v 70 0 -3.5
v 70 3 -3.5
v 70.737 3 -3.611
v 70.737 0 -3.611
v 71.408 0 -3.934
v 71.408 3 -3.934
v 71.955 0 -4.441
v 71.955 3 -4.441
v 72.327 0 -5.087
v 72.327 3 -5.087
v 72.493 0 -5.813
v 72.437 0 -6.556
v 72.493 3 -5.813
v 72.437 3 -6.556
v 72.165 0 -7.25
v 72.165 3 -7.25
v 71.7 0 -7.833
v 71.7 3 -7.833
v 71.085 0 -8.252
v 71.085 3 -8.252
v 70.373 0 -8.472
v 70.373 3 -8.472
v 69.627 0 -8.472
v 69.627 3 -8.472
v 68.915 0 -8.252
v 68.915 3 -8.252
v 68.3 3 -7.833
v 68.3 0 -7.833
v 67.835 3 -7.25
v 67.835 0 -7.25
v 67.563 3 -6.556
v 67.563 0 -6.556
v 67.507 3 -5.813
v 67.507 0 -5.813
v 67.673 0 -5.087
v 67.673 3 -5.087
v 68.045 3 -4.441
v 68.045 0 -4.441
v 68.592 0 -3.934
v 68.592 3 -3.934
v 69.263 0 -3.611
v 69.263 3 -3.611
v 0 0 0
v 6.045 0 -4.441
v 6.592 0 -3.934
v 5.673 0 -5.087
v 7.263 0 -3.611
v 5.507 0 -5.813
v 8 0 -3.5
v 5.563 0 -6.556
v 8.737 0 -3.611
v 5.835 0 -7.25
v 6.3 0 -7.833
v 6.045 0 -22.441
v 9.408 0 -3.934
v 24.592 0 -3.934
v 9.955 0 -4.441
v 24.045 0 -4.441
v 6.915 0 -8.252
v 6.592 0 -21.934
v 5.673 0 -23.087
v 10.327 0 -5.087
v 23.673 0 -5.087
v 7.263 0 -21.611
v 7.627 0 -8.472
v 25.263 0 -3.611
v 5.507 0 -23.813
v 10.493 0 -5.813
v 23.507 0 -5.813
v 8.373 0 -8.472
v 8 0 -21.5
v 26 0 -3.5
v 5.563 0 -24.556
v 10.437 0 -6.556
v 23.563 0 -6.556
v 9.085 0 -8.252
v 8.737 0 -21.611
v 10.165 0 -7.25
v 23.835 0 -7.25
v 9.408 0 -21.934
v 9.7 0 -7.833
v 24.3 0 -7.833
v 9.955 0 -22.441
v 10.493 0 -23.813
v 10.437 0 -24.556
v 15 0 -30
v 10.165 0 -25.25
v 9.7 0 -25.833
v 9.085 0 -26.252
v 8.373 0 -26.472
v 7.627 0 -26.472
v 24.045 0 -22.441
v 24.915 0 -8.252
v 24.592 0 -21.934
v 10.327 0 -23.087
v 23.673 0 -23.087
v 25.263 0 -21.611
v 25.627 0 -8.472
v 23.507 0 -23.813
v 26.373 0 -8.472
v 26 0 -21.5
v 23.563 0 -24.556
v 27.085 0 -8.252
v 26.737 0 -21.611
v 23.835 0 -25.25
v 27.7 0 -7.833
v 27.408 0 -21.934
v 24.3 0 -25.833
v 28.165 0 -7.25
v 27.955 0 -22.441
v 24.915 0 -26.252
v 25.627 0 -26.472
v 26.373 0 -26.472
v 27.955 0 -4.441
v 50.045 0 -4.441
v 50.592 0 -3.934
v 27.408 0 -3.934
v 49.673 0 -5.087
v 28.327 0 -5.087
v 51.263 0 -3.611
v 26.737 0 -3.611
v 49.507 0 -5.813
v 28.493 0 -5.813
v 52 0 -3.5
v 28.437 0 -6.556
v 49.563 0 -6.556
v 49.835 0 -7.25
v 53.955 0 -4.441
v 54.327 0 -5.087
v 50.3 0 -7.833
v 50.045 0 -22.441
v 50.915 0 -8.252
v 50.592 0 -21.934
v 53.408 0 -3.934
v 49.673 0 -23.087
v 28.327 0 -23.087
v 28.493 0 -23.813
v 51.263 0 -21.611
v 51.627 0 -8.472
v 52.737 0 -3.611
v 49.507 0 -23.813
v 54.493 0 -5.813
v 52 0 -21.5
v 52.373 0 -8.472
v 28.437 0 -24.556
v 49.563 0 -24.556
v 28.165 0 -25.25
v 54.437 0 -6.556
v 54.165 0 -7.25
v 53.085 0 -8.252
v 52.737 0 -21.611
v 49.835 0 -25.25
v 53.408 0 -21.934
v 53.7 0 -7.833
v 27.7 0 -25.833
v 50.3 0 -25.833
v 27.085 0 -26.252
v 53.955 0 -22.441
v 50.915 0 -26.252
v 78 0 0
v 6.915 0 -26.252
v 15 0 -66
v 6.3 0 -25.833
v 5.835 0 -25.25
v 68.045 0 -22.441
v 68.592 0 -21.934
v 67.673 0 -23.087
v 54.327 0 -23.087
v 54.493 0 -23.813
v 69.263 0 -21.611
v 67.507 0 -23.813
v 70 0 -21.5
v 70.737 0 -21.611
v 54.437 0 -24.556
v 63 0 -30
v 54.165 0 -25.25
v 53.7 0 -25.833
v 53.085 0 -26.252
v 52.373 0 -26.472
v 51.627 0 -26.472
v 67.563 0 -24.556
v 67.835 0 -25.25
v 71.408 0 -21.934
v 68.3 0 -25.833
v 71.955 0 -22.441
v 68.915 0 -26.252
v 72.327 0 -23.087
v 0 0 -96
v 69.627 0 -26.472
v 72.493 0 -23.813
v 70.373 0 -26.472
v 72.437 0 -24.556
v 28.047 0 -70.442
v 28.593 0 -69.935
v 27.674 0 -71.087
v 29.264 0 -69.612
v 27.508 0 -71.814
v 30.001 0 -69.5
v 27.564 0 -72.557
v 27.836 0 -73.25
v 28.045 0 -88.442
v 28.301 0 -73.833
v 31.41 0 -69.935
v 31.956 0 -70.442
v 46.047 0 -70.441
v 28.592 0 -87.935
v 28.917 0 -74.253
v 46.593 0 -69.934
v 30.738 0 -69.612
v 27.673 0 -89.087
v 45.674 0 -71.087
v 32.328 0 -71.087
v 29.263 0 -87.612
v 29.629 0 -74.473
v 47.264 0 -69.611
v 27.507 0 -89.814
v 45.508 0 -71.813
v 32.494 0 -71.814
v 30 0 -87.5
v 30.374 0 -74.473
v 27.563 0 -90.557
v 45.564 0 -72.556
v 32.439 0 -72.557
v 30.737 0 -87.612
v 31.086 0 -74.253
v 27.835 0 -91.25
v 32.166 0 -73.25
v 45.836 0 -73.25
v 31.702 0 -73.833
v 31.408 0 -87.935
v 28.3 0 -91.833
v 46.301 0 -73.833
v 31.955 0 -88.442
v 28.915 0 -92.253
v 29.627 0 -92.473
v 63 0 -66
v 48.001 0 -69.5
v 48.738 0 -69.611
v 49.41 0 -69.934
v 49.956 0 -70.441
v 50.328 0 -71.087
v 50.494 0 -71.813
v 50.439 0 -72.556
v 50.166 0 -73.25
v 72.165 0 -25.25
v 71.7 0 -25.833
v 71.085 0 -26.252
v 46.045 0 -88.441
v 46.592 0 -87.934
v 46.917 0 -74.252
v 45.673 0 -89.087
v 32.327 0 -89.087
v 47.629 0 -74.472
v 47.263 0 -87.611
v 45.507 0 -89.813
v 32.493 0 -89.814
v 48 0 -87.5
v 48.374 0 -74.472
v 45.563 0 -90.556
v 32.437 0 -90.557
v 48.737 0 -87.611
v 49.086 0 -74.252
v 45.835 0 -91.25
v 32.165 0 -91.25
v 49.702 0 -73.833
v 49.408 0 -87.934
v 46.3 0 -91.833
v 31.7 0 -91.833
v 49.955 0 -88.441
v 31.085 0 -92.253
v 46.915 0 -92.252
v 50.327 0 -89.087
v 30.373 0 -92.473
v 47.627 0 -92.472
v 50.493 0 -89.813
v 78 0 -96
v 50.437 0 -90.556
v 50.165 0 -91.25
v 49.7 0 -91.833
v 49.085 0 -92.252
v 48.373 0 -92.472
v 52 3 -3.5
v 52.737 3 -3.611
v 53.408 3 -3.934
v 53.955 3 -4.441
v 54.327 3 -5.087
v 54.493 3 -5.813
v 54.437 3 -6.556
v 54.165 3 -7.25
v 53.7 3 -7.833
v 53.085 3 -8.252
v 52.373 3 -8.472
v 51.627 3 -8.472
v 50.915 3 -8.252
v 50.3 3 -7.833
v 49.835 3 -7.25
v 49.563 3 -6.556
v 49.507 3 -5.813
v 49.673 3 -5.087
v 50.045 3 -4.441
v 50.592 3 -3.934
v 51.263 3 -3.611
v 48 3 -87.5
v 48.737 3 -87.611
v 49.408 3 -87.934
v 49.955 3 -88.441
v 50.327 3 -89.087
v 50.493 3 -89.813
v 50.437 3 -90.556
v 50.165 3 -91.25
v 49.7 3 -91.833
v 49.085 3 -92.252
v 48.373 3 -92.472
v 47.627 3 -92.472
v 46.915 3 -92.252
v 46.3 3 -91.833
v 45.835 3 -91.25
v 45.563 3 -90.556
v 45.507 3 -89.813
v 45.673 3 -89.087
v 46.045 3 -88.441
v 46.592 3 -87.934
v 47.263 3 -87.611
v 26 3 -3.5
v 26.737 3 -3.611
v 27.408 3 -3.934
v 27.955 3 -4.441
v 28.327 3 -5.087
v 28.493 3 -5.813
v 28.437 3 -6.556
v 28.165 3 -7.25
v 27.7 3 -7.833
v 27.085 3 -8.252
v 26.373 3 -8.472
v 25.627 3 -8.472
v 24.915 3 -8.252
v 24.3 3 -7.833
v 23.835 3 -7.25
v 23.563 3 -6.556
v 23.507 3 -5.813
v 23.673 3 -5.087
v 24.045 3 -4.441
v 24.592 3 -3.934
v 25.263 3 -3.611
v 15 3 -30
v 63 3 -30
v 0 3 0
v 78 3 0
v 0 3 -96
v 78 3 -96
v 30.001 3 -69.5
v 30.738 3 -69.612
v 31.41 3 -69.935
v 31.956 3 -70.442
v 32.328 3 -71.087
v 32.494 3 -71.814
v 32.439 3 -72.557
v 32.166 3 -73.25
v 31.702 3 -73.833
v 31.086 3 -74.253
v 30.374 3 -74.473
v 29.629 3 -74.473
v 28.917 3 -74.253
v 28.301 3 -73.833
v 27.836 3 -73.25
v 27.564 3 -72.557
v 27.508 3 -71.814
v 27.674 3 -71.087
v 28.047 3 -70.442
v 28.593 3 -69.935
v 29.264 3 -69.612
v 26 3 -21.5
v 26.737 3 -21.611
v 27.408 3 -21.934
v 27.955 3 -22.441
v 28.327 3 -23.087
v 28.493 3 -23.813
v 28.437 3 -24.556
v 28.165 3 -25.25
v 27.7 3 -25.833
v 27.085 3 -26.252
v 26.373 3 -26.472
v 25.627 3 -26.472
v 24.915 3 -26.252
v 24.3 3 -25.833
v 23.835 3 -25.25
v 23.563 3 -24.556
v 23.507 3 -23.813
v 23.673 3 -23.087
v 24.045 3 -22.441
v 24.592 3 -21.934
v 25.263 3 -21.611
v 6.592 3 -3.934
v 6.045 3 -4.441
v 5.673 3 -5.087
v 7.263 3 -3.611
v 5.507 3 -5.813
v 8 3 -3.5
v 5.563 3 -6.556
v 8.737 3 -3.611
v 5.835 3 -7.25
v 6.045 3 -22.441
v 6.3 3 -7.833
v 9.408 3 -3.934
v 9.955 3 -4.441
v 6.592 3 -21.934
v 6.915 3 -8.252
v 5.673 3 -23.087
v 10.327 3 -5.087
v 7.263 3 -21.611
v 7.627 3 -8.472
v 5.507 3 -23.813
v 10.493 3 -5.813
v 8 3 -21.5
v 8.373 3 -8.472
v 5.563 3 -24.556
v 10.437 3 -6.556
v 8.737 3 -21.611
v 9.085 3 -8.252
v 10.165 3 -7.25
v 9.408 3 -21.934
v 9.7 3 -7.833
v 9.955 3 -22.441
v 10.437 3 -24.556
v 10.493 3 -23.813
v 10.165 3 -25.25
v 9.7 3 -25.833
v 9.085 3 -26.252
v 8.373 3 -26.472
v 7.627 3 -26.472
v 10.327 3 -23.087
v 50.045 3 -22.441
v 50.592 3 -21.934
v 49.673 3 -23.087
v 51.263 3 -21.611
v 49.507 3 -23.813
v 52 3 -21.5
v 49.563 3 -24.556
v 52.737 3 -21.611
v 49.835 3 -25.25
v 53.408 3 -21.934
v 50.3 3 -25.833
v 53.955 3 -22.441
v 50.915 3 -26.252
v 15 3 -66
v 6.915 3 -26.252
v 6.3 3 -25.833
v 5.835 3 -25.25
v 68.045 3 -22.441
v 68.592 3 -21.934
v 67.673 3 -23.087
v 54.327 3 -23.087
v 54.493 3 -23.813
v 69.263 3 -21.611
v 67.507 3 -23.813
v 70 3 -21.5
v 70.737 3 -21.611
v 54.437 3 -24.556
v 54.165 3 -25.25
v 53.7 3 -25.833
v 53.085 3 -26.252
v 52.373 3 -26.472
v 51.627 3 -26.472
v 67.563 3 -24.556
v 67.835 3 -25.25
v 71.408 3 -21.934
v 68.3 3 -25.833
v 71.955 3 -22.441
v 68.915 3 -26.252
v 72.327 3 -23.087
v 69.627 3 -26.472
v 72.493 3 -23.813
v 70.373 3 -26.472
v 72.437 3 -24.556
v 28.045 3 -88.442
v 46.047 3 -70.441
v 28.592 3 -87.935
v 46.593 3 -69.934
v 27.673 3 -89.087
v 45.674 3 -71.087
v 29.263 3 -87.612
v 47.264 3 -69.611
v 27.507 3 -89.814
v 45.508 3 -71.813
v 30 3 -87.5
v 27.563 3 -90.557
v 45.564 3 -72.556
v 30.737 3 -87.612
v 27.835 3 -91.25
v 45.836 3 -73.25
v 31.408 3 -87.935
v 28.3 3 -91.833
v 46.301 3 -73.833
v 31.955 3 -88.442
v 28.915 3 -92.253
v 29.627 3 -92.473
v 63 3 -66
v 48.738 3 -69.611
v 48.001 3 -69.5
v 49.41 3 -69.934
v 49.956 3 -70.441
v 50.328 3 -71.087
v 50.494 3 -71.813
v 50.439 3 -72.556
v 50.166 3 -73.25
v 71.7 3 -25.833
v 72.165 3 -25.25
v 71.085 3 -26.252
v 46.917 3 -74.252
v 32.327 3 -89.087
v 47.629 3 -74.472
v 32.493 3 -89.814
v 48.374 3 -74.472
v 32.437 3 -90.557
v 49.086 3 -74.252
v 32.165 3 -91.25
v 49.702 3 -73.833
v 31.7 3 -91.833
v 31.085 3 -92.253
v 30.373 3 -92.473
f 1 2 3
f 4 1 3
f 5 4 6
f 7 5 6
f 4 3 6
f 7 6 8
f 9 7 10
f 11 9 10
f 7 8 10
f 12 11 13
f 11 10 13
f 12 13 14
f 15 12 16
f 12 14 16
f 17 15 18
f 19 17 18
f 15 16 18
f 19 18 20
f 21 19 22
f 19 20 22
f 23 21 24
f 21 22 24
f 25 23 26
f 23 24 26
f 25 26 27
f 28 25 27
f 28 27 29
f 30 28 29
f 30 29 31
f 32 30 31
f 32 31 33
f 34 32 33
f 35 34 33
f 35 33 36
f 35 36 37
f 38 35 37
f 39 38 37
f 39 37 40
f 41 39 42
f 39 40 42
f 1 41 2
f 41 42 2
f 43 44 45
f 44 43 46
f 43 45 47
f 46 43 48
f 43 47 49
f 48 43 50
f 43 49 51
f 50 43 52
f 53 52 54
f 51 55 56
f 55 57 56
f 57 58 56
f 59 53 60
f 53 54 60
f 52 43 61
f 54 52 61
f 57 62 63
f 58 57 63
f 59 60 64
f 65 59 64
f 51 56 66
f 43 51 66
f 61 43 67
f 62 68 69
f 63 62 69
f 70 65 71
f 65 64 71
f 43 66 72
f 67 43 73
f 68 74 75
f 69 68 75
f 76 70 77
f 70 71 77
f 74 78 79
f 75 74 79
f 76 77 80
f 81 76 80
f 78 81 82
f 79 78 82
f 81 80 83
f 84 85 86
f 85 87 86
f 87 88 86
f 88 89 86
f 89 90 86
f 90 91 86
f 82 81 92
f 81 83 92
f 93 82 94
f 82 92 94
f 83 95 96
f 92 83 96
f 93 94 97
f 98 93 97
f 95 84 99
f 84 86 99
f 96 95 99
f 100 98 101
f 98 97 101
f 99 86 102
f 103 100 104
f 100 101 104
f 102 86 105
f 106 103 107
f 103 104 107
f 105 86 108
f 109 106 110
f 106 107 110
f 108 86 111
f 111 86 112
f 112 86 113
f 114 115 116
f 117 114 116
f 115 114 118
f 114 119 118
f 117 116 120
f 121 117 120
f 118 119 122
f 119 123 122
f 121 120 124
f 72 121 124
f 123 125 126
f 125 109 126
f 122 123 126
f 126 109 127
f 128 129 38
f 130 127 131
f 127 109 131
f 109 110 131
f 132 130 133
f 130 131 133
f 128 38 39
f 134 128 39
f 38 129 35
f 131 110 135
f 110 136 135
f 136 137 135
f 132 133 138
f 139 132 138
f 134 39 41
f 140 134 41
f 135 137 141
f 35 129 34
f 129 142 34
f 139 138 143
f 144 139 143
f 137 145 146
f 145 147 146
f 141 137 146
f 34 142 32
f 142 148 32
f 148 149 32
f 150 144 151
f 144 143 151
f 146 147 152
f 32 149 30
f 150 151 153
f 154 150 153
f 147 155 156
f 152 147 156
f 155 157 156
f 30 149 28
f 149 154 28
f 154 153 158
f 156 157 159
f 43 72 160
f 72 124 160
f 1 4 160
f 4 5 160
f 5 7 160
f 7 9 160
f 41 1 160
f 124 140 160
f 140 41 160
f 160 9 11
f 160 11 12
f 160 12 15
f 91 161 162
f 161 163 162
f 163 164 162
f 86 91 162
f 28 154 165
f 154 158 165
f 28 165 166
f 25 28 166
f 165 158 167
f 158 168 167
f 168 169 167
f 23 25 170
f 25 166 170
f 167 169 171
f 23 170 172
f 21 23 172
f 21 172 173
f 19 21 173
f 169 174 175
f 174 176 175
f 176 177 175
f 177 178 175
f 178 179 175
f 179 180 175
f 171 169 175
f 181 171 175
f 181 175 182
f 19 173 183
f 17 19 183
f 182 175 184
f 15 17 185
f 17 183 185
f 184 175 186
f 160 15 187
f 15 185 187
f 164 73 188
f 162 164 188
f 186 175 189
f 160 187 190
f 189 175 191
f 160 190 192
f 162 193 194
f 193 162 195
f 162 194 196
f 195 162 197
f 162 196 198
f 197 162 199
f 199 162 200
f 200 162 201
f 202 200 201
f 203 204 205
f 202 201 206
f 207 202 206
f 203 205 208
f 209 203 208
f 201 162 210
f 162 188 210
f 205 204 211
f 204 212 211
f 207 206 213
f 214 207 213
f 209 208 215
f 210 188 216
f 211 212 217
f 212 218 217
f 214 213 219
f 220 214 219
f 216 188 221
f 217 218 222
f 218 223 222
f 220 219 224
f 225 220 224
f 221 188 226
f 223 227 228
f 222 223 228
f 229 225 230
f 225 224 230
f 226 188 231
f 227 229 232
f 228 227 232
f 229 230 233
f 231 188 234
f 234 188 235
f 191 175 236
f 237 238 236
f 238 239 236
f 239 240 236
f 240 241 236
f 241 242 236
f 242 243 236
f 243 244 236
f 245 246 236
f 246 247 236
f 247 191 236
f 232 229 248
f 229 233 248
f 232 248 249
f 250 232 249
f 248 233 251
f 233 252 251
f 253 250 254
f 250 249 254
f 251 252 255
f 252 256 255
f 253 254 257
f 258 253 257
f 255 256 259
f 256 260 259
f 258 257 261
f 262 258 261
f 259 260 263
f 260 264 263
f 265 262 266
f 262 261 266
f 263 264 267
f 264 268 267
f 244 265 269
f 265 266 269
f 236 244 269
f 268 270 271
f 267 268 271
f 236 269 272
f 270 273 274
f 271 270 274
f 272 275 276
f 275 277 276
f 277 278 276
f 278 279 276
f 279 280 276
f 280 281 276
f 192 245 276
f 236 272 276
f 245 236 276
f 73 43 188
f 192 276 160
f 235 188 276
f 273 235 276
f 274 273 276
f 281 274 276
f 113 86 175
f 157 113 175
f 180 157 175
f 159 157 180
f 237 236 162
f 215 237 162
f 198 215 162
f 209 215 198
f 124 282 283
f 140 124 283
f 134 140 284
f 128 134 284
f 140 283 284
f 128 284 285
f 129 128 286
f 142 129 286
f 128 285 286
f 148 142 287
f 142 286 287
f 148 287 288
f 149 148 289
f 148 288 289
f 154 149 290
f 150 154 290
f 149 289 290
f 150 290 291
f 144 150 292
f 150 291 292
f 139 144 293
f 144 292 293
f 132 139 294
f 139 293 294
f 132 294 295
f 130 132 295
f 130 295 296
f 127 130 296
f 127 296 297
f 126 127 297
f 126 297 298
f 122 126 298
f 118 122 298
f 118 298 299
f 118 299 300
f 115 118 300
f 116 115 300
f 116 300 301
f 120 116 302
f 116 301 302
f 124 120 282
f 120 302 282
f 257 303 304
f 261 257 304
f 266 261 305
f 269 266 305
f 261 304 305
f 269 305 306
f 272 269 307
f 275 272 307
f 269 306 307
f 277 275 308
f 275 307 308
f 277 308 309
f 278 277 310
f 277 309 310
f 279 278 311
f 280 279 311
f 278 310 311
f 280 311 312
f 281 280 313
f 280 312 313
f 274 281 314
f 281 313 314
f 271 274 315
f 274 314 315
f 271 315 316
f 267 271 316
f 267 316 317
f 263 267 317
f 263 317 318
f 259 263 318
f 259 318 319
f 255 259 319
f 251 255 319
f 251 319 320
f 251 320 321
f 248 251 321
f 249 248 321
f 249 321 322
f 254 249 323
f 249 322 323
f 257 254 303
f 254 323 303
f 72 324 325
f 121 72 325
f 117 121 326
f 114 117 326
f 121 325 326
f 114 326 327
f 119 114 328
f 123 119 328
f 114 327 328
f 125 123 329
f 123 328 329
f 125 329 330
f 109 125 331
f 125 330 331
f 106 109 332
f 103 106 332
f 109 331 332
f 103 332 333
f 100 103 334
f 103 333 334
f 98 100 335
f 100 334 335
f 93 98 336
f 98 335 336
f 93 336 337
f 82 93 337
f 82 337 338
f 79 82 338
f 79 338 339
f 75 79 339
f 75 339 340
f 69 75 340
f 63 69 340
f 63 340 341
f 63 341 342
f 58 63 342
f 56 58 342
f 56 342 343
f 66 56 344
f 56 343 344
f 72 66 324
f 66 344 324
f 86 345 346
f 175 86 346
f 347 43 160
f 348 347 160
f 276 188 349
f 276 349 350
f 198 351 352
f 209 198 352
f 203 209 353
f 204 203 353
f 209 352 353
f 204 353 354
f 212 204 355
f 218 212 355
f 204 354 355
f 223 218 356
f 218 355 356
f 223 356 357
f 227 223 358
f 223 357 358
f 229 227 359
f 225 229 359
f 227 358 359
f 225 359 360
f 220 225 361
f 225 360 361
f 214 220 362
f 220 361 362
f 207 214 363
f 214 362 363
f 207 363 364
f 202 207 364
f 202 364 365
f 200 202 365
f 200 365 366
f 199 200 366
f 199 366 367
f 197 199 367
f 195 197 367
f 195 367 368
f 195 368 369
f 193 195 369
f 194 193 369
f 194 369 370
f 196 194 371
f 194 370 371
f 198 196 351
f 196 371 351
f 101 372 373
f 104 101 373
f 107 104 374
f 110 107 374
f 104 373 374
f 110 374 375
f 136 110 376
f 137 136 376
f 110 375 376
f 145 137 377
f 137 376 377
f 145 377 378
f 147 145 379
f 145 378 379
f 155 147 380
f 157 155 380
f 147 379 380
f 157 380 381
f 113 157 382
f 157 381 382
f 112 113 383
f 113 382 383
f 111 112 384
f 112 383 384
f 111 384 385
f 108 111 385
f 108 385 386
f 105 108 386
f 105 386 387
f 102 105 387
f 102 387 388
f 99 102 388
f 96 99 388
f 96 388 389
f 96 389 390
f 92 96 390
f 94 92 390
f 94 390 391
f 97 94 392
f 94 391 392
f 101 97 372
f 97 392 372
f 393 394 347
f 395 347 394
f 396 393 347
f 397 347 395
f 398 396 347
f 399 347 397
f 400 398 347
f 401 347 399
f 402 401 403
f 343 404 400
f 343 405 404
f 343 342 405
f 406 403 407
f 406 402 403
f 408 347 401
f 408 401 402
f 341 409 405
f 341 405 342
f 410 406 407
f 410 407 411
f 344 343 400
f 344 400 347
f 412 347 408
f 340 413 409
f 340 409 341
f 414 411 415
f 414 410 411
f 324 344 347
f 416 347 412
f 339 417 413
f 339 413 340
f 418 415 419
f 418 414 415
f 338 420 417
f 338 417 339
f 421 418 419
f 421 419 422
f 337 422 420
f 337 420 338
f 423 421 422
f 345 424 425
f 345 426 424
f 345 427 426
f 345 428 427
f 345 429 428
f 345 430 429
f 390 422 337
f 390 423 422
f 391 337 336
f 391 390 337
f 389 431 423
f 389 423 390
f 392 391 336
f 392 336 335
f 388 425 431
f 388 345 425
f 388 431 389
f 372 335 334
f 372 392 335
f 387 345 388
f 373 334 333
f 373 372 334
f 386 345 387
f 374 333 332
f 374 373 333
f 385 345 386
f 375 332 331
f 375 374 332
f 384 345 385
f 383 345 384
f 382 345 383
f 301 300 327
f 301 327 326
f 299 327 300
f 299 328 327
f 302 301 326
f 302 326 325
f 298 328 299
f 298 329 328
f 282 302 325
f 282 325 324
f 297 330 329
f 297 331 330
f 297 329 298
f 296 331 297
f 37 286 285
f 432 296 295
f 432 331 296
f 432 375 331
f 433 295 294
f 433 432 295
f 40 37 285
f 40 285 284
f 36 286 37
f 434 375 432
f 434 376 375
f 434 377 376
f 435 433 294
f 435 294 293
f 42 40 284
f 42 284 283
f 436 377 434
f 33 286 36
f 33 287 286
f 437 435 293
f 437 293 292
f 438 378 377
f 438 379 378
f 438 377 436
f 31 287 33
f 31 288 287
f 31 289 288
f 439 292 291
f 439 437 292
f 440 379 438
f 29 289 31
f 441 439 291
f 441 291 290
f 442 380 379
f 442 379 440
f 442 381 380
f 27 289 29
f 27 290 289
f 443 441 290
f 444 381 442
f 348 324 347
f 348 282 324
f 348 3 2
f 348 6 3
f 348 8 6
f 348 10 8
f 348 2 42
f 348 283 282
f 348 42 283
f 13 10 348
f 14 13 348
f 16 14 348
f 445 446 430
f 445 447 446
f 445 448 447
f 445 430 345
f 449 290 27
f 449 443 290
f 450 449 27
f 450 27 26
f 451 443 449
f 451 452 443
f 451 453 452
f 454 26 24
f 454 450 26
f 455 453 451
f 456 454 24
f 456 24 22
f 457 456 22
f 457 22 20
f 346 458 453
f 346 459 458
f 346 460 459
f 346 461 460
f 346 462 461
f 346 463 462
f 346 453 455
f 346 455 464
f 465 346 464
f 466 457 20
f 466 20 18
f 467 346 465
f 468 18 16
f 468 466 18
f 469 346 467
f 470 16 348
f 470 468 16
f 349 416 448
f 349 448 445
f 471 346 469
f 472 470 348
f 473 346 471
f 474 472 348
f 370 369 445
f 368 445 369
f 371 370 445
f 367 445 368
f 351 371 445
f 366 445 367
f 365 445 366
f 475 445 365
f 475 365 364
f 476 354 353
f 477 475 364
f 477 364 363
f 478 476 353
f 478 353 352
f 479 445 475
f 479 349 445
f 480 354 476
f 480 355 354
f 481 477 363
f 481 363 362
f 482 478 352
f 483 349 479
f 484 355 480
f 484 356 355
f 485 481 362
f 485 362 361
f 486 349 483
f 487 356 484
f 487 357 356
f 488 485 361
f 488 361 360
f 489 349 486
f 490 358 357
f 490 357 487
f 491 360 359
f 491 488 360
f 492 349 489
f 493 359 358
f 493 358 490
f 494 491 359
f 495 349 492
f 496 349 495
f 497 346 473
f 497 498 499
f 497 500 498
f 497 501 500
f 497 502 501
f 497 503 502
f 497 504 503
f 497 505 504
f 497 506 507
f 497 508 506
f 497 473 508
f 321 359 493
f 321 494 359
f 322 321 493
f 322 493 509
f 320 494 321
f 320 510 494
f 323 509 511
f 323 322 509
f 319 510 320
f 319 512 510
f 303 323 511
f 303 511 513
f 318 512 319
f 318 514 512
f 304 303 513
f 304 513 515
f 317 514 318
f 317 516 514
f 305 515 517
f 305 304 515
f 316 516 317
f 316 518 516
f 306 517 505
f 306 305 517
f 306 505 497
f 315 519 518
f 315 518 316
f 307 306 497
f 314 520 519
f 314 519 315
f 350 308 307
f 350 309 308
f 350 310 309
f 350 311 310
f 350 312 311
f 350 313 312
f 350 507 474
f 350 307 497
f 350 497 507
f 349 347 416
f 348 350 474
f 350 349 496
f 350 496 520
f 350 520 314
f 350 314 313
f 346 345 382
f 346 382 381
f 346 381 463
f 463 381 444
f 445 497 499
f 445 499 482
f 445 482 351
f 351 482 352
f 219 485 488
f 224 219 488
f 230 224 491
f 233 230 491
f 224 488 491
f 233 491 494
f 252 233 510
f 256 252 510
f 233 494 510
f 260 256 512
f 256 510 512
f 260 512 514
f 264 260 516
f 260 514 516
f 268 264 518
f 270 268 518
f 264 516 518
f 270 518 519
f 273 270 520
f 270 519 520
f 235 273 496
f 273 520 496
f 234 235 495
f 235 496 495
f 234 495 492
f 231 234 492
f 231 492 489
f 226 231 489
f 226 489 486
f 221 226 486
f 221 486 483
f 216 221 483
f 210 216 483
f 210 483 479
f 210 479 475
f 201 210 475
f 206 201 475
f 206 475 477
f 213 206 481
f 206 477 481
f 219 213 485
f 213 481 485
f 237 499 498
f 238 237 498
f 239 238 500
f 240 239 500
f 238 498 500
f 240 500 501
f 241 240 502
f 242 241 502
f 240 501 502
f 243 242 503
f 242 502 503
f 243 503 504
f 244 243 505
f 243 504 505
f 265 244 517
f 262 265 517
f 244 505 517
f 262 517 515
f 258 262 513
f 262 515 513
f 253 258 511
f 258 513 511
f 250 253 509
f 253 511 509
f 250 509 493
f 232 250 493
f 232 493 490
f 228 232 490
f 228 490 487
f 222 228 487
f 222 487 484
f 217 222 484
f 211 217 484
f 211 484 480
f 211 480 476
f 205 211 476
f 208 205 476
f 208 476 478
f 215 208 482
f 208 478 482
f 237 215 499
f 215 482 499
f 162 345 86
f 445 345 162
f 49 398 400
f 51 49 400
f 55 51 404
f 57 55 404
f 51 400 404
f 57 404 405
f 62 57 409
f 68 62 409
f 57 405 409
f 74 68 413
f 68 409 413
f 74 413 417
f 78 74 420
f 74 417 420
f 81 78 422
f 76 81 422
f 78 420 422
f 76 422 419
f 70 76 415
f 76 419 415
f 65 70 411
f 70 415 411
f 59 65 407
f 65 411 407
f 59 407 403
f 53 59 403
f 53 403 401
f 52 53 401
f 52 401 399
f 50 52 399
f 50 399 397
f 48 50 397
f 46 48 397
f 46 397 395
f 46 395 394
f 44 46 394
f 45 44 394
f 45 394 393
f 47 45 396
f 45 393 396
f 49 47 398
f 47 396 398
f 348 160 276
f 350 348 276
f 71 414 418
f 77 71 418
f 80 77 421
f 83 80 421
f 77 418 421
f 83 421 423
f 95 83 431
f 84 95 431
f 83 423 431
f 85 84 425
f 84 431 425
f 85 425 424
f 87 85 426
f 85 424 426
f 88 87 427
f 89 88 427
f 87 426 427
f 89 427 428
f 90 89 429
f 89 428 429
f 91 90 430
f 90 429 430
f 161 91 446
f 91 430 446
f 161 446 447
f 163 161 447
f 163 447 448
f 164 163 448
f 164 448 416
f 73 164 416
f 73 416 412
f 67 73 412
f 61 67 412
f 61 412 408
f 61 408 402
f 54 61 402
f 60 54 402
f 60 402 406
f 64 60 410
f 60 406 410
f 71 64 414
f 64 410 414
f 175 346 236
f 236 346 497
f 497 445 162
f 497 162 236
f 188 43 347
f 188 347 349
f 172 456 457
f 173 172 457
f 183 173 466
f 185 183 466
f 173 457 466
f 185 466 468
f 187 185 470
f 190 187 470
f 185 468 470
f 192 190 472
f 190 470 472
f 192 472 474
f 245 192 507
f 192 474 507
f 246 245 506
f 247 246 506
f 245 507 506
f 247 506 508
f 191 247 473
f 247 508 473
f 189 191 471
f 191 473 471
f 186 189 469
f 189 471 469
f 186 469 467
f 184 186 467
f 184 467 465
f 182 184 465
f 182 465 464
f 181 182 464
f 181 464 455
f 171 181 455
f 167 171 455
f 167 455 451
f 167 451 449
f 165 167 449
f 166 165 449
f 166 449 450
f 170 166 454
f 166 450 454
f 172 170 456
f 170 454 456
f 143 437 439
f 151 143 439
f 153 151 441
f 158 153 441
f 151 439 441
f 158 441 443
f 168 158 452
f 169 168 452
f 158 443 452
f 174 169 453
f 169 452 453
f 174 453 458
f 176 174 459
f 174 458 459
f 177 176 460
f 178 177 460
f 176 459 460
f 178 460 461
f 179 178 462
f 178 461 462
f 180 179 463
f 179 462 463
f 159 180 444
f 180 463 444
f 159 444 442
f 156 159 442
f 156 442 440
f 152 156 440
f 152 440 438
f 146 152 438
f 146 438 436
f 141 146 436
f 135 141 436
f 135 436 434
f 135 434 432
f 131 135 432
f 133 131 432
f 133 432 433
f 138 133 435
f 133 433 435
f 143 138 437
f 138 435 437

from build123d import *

# Parameters (mm, degrees)
SKETCH1_W           = 78
SKETCH1_H           = 96
BOSS_EXTRUDE1_DEPTH = 3
SKETCH2_R           = 2.5
CUT_EXTRUDE1_DEPTH  = 3
SKETCH3_W           = 48
SKETCH3_H           = 36.000458934
CUT_EXTRUDE2_DEPTH  = 3


with BuildPart() as part:
    # Sketch1 → Boss-Extrude1 (new body)
    with BuildSketch(Plane(origin=(0, 0, 0), x_dir=(1, 0, 0), z_dir=(0, 1, 0))):
        with Locations((39, 48)):
            Rectangle(SKETCH1_W, SKETCH1_H)
    extrude(amount=BOSS_EXTRUDE1_DEPTH)

    # Sketch2 → Cut-Extrude1 (cut)
    with BuildSketch(Plane(origin=(0, 3, 0), x_dir=(1, 0, 0), z_dir=(0, 1, 0))):
        with Locations(Location((8, 6, 0), (0, 0, 270))):
            Circle(SKETCH2_R)
        with Locations(Location((26, 6, 0), (0, 0, 270))):
            Circle(SKETCH2_R)
        with Locations(Location((8, 24, 0), (0, 0, 270))):
            Circle(SKETCH2_R)
        with Locations(Location((26, 24, 0), (0, 0, 270))):
            Circle(SKETCH2_R)
        with Locations(Location((52, 6, 0), (0, 0, 270))):
            Circle(SKETCH2_R)
        with Locations(Location((70, 6, 0), (0, 0, 270))):
            Circle(SKETCH2_R)
        with Locations(Location((70, 24, 0), (0, 0, 270))):
            Circle(SKETCH2_R)
        with Locations(Location((52, 24, 0), (0, 0, 270))):
            Circle(SKETCH2_R)
        with Locations(Location((48.001269273, 72.000000045, 0), (0, 0, 270))):
            Circle(SKETCH2_R)
        with Locations(Location((30.001269279, 72.000458934, 0), (0, 0, 270))):
            Circle(SKETCH2_R)
        with Locations(Location((48, 90, 0), (0, 0, 270))):
            Circle(SKETCH2_R)
        with Locations(Location((30.000000006, 90.000458889, 0), (0, 0, 270))):
            Circle(SKETCH2_R)
    extrude(amount=-CUT_EXTRUDE1_DEPTH, mode=Mode.SUBTRACT)

    # Sketch3 → Cut-Extrude2 (cut)
    with BuildSketch(Plane(origin=(0, 3, 0), x_dir=(1, 0, 0), z_dir=(0, 1, 0))):
        with Locations((39, 48.000229467)):
            Rectangle(SKETCH3_W, SKETCH3_H)
    extrude(amount=-CUT_EXTRUDE2_DEPTH, mode=Mode.SUBTRACT)


solid = part.part
